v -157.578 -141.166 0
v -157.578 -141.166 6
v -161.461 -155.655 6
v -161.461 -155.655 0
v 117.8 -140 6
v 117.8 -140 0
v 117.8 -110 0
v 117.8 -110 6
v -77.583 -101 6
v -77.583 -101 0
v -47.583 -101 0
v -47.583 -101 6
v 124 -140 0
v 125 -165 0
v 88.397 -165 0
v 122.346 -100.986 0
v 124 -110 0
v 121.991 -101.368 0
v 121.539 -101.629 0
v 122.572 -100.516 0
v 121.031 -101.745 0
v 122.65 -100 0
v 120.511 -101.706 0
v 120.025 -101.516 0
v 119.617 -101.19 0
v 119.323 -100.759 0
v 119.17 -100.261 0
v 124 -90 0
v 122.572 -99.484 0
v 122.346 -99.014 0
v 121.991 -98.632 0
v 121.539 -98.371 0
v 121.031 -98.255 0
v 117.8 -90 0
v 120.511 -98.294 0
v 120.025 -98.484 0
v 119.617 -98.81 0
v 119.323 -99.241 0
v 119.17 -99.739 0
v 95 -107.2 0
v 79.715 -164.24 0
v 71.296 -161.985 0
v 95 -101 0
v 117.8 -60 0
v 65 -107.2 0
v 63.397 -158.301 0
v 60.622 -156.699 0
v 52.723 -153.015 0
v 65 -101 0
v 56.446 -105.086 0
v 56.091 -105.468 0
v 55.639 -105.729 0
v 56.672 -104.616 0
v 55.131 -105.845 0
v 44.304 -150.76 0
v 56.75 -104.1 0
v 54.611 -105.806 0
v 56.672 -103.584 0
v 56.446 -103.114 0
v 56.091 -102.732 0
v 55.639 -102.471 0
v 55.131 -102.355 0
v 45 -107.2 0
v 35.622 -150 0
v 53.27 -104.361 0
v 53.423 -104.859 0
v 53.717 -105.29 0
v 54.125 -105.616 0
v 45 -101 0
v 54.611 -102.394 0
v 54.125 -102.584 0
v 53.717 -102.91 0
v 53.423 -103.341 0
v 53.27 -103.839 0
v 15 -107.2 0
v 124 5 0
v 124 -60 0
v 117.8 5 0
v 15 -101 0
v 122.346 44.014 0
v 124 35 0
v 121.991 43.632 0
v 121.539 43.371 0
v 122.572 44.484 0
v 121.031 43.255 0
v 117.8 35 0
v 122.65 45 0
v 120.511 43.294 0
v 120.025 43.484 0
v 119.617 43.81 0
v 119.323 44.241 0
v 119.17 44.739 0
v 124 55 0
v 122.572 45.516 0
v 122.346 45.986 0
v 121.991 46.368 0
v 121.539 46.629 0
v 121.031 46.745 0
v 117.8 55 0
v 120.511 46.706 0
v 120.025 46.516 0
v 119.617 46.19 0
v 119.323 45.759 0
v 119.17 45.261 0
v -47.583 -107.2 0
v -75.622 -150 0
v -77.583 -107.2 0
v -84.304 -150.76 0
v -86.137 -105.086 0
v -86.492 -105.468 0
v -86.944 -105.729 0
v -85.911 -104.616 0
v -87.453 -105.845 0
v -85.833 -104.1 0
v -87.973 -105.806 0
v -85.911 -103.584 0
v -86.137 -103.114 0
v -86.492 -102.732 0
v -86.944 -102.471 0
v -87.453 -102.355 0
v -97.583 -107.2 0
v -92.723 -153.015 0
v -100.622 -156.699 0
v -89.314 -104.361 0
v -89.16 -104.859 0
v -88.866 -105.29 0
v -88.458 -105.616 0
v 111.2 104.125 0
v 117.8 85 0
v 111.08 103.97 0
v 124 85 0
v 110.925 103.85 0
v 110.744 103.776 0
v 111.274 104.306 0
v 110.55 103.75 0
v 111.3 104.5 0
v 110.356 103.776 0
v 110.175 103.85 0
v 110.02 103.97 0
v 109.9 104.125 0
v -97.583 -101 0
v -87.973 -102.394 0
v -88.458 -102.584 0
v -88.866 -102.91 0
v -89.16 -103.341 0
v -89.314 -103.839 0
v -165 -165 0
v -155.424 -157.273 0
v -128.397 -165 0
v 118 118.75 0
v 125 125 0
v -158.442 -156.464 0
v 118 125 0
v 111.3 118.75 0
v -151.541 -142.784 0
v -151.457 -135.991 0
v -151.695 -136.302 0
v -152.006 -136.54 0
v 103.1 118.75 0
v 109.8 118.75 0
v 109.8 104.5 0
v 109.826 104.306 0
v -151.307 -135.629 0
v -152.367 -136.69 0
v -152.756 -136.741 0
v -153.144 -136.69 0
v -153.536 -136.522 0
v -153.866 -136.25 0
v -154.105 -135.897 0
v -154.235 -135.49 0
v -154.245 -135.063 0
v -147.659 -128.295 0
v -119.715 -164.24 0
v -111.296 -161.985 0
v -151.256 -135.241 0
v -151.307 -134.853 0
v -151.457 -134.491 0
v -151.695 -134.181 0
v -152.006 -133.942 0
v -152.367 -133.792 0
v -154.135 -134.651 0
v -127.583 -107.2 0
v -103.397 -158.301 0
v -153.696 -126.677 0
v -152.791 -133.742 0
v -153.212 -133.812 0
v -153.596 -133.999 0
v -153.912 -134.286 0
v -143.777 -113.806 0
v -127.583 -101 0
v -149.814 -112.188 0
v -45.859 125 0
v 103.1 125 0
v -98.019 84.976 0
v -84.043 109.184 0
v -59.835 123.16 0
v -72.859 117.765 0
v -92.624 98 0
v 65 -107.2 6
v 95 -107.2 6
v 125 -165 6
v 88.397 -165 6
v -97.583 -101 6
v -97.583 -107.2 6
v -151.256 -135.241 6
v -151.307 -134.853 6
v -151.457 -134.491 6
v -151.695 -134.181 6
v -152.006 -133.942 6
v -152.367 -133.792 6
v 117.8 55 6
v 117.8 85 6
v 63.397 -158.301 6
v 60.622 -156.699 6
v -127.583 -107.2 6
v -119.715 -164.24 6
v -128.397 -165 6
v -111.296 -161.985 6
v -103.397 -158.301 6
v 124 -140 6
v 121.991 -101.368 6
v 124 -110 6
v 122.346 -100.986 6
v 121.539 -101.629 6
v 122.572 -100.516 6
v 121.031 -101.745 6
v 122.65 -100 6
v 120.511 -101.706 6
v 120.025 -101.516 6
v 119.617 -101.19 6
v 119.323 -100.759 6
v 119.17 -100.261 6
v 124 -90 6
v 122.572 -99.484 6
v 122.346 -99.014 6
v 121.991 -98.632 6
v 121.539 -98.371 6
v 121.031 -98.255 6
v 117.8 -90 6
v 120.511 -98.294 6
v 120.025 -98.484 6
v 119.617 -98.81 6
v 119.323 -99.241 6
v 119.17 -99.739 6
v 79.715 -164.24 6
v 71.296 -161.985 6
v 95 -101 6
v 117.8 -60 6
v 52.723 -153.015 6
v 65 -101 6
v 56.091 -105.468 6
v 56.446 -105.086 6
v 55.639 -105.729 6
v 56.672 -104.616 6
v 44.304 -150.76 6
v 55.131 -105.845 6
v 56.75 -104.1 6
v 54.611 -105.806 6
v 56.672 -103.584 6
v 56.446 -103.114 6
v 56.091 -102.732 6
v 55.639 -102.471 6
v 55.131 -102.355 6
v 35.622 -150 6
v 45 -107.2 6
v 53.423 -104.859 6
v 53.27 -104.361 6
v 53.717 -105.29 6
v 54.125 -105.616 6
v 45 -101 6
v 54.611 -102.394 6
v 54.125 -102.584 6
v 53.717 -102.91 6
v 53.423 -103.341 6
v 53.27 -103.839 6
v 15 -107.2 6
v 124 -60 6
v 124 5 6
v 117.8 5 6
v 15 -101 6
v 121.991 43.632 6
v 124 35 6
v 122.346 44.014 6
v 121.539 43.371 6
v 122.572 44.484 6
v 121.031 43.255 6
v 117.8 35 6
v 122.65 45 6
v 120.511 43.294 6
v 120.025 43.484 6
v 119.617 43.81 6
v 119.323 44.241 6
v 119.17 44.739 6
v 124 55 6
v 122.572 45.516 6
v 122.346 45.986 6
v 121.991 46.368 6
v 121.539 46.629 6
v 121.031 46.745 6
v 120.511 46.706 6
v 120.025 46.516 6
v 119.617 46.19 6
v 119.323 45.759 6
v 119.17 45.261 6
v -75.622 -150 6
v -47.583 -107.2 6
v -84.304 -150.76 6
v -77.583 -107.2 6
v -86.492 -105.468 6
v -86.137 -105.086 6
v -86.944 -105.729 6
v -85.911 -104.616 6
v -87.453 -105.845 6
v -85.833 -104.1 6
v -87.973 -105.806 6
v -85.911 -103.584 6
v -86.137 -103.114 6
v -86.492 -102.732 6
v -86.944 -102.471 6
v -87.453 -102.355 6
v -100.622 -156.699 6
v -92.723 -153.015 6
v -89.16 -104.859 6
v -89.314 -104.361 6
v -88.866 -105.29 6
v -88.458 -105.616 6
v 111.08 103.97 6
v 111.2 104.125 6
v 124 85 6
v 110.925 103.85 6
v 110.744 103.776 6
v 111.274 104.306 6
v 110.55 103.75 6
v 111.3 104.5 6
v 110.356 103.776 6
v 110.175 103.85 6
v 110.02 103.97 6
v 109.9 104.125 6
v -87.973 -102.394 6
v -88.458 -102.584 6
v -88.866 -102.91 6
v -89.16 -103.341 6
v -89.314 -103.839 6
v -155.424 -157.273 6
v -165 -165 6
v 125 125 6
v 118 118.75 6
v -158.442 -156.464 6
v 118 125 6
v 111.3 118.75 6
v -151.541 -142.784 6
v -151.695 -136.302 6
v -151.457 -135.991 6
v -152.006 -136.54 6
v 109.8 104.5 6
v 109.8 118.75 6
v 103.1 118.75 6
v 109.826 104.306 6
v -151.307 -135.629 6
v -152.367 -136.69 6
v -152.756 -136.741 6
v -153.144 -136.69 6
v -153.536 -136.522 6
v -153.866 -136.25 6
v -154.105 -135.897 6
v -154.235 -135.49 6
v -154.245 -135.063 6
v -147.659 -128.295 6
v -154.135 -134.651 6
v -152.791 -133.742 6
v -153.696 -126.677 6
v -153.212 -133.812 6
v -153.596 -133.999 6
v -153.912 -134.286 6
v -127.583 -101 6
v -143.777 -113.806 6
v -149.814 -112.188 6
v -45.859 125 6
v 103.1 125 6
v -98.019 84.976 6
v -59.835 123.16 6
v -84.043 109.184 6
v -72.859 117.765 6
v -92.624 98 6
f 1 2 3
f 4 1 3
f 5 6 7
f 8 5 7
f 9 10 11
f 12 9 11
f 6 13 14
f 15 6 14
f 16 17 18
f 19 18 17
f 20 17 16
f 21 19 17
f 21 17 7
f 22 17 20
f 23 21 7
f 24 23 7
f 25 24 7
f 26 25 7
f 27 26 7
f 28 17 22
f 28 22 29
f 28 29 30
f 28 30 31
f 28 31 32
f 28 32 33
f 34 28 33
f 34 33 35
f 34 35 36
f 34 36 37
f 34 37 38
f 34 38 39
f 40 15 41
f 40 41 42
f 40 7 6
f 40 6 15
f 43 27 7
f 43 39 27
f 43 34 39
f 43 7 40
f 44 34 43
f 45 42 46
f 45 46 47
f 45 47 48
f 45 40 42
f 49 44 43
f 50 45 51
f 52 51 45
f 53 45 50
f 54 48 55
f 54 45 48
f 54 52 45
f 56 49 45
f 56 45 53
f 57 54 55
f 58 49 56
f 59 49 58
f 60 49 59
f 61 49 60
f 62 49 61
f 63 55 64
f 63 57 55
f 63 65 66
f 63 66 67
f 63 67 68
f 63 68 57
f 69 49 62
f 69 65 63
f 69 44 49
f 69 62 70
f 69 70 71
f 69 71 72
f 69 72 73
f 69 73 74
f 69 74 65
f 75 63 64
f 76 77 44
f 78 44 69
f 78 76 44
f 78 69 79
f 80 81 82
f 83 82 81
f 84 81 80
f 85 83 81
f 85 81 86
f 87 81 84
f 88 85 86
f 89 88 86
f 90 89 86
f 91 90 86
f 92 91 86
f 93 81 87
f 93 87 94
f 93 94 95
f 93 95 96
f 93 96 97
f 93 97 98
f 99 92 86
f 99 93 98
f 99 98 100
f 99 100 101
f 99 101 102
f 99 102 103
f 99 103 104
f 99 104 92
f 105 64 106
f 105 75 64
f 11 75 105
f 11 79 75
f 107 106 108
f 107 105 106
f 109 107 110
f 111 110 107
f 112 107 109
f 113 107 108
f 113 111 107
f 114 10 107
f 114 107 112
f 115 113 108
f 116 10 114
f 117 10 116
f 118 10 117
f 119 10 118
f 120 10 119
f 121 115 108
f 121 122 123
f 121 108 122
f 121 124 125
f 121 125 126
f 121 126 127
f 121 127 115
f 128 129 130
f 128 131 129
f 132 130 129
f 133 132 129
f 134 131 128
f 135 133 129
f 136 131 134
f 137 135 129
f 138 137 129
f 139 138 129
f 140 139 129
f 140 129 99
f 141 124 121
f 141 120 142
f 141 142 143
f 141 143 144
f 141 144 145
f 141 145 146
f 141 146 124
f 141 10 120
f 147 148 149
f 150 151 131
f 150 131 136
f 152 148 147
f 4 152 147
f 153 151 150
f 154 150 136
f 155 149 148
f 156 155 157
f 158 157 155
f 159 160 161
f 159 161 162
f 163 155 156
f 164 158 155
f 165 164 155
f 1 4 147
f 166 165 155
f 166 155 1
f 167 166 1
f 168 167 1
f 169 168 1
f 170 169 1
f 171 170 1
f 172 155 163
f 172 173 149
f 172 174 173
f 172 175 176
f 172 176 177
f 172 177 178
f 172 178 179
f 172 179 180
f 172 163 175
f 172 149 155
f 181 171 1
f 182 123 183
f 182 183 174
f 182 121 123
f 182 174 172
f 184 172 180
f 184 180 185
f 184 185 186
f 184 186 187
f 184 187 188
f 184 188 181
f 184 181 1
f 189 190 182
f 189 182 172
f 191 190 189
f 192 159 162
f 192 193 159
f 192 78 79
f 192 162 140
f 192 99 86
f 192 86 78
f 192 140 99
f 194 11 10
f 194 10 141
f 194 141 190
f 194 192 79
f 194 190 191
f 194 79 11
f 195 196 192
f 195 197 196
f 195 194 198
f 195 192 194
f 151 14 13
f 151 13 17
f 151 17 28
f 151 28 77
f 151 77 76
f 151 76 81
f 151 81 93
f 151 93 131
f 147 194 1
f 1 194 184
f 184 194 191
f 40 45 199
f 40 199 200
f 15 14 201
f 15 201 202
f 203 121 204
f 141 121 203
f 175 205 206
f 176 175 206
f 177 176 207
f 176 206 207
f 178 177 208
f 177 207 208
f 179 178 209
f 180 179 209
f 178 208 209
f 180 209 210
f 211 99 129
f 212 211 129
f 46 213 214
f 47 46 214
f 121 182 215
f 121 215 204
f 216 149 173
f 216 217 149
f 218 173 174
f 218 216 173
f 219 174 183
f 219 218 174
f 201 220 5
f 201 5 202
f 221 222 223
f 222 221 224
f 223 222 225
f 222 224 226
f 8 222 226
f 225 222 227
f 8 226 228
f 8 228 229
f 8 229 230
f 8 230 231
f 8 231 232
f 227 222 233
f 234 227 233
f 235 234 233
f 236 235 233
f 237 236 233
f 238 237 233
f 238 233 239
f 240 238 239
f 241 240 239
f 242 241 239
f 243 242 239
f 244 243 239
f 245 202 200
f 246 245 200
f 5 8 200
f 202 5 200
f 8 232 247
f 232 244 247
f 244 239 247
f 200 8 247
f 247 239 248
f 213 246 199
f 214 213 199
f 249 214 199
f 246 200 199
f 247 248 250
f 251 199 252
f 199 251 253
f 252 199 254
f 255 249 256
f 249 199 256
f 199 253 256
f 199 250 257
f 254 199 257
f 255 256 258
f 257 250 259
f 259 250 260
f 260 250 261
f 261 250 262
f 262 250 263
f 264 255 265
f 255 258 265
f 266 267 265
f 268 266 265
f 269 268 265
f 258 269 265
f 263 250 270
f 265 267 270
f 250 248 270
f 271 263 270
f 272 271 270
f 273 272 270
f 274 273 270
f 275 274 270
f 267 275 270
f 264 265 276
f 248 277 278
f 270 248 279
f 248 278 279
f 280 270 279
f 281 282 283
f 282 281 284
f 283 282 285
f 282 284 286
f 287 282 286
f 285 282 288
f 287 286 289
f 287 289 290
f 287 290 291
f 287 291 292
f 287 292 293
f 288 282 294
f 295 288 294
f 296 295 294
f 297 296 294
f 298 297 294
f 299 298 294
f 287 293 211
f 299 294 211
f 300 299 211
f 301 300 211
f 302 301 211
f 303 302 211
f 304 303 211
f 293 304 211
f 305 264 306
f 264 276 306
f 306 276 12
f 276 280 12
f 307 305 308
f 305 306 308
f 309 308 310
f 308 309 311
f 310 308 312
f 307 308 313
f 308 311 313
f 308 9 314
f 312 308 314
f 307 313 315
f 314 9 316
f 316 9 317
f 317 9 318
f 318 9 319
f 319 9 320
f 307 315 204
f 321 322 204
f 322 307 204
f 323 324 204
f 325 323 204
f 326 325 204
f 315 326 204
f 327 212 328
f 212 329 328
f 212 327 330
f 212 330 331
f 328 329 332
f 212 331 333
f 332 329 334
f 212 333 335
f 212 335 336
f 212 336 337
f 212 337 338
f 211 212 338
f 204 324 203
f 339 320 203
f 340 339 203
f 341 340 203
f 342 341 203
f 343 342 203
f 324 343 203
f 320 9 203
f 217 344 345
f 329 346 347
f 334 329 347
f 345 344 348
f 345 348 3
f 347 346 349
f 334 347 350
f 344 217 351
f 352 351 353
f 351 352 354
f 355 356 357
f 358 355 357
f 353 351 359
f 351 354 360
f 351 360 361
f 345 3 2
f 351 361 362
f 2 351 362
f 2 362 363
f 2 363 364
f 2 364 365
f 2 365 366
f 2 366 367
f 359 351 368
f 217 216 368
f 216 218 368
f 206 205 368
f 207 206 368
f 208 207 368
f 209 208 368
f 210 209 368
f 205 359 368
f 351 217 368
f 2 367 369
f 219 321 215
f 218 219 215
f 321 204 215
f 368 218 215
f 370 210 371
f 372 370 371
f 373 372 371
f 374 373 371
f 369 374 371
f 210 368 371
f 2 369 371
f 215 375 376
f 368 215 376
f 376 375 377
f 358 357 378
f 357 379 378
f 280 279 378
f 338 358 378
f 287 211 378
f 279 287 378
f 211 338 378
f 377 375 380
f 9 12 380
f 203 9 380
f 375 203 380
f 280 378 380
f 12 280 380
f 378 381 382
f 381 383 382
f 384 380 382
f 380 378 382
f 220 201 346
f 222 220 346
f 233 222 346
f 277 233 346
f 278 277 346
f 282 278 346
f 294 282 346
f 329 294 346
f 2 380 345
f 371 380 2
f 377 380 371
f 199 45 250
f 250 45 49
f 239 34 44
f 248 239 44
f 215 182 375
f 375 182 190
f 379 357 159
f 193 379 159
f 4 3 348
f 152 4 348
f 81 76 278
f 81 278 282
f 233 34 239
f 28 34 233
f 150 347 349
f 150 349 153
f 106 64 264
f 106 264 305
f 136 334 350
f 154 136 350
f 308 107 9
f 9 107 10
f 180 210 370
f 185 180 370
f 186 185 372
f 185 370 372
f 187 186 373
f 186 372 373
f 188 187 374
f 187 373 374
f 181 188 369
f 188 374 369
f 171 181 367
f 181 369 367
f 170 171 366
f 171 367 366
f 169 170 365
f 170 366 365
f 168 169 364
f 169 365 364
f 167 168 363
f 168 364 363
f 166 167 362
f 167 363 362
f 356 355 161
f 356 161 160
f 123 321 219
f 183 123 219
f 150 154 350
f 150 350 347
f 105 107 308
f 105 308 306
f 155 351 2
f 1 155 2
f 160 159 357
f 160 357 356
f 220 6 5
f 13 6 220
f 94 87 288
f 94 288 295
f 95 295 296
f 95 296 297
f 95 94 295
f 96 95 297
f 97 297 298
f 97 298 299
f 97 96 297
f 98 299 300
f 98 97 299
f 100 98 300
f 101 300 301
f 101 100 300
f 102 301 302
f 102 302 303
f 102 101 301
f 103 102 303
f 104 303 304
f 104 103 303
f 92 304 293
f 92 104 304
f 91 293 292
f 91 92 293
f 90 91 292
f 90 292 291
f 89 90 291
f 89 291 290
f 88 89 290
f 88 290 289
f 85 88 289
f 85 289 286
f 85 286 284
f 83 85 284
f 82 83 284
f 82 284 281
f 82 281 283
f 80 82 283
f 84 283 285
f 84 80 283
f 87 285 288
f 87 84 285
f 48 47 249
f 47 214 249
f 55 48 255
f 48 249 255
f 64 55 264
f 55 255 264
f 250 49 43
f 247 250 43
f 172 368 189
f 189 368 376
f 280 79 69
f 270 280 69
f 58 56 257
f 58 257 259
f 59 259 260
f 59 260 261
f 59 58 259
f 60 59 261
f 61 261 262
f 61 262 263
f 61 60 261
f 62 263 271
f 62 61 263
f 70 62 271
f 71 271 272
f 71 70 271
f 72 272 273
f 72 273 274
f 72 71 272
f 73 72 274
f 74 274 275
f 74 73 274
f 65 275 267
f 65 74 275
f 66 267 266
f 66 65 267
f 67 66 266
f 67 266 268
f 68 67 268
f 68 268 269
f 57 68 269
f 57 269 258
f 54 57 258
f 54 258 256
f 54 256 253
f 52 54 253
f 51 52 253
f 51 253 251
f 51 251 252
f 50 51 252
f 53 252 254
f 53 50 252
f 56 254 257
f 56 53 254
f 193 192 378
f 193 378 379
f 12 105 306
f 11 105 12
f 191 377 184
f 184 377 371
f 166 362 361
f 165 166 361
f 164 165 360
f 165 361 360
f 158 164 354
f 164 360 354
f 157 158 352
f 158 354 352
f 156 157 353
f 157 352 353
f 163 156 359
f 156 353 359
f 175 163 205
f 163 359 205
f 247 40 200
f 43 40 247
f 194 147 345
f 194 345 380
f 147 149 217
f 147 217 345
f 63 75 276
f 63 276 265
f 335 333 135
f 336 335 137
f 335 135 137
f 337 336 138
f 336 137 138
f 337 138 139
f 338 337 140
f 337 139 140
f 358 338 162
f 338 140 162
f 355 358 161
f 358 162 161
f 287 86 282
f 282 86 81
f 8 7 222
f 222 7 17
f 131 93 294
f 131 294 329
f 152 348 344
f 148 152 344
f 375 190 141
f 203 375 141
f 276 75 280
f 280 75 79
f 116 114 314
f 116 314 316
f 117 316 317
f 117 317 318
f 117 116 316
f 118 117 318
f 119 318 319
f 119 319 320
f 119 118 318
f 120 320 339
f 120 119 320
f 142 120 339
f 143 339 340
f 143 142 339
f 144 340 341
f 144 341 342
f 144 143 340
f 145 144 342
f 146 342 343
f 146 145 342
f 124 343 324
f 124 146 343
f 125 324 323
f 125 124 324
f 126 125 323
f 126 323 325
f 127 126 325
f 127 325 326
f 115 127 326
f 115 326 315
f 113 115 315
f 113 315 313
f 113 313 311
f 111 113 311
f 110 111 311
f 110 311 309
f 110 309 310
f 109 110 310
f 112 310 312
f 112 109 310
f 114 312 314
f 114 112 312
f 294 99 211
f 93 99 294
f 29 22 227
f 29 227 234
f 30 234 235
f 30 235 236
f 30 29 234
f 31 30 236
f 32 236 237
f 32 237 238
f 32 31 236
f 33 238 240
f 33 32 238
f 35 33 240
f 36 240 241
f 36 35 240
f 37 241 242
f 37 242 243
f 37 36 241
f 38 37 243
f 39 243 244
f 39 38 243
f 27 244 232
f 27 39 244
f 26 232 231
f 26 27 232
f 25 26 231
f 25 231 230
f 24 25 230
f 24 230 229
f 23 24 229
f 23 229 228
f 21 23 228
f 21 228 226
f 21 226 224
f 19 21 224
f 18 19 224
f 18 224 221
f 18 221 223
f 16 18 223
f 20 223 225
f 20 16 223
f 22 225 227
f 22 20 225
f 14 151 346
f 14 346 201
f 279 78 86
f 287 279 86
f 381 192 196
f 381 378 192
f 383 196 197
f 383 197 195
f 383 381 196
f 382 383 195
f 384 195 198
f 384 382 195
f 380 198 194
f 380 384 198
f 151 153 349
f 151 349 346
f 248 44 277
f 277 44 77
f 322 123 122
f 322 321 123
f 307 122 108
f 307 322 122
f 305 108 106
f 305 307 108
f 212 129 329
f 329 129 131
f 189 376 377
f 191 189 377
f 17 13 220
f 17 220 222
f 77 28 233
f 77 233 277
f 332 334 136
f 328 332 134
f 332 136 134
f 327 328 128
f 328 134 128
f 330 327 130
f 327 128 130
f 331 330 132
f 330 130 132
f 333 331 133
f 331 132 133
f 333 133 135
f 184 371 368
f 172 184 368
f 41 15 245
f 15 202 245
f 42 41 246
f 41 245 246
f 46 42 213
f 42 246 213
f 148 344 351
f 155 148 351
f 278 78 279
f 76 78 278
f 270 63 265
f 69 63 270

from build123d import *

# Parameters (mm, degrees)
ESBO_O1_R                = 1.75
ESBO_O1_W                = 30
ESBO_O1_H                = 6.2
ESBO_O1_W_2              = 6.2
ESBO_O1_H_2              = 30
RESSALTO_EXTRUS_O1_DEPTH = 6
FILETE1_R                = 54
FILETE2_R                = 50
ESBO_O2_W                = 14.9
ESBO_O2_H                = 6
CORTE_EXTRUS_O1_DEPTH    = 6.25
ESBO_O3_W                = 1.5
ESBO_O3_H                = 15
CORTE_EXTRUS_O2_DEPTH    = 10
FILETE3_R                = 0.75
CORTE_EXTRUS_O3_DEPTH    = 22


with BuildPart() as part:
    # Esboço1 → Ressalto-extrusão1 (new body)
    with BuildSketch(Plane.XY):
        Polygon((125, -165), (75, -165), (49.019237886, -150), (-89.019237886, -150), (-115, -165), (-165, -165), (-87.294734195, 125), (125, 125), align=None)
        with Locations((-87.583302492, -104.1)):
            Circle(ESBO_O1_R, mode=Mode.SUBTRACT)
        with Locations((120.9, 45)):
            Circle(ESBO_O1_R, mode=Mode.SUBTRACT)
        with Locations((55, -104.1)):
            Circle(ESBO_O1_R, mode=Mode.SUBTRACT)
        with Locations((120.9, -100)):
            Circle(ESBO_O1_R, mode=Mode.SUBTRACT)
        with Locations((80, -104.1)):
            Rectangle(ESBO_O1_W, ESBO_O1_H, mode=Mode.SUBTRACT)
        with Locations((30, -104.1)):
            Rectangle(ESBO_O1_W, ESBO_O1_H, mode=Mode.SUBTRACT)
        with Locations((-112.583302492, -104.1)):
            Rectangle(ESBO_O1_W, ESBO_O1_H, mode=Mode.SUBTRACT)
        with Locations((-62.583302492, -104.1)):
            Rectangle(ESBO_O1_W, ESBO_O1_H, mode=Mode.SUBTRACT)
        with Locations((120.9, 70)):
            Rectangle(ESBO_O1_W_2, ESBO_O1_H_2, mode=Mode.SUBTRACT)
        with Locations((120.9, 20)):
            Rectangle(ESBO_O1_W_2, ESBO_O1_H_2, mode=Mode.SUBTRACT)
        with Locations((120.9, -125)):
            Rectangle(ESBO_O1_W_2, ESBO_O1_H_2, mode=Mode.SUBTRACT)
        with Locations((120.9, -75)):
            Rectangle(ESBO_O1_W_2, ESBO_O1_H_2, mode=Mode.SUBTRACT)
    extrude(amount=RESSALTO_EXTRUS_O1_DEPTH)

    # Filete1
    filete1_edges = [part.edges().sort_by_distance(p)[0] for p in [
        (-87.294734195, 125, 3),
    ]]
    fillet(filete1_edges, radius=FILETE1_R)

    # Filete2
    filete2_edges = [part.edges().sort_by_distance(p)[0] for p in [
        (75, -165, 3),
        (49.019237886, -150, 3),
        (-89.019237886, -150, 3),
        (-115, -165, 3),
    ]]
    fillet(filete2_edges, radius=FILETE2_R)

    # Esboço2 → Corte-extrusão1 (cut)
    with BuildSketch(Plane(origin=(0, 125, 0), x_dir=(1, 0, 0), z_dir=(0, 1, 0))):
        with Locations((110.55, -3)):
            Rectangle(ESBO_O2_W, ESBO_O2_H)
    extrude(amount=-CORTE_EXTRUS_O1_DEPTH, mode=Mode.SUBTRACT)

    # Esboço3 → Corte-extrusão2 (cut)
    with BuildSketch(Plane.XY.offset(6)):
        with Locations((110.55, 111.25)):
            Rectangle(ESBO_O3_W, ESBO_O3_H)
    extrude(amount=-CORTE_EXTRUS_O2_DEPTH, mode=Mode.SUBTRACT)

    # Filete3
    filete3_edges = [part.edges().sort_by_distance(p)[0] for p in [
        (111.3, 103.75, 3),
        (109.8, 103.75, 3),
    ]]
    fillet(filete3_edges, radius=FILETE3_R - 0.0001)  # a hair under: the kernel refuses the full size

    # Esboço4 → Corte-extrusão3 (cut)
    with BuildSketch(Plane.XY.offset(6)):
        Polygon((-149.813874716, -112.188312175), (-153.696160392, -126.677199569), (-150.677642185, -127.486009085), (-146.795356509, -112.997121691), align=None)
        Polygon((-146.795356509, -112.997121691), (-150.677642185, -127.486009085), (-147.659123978, -128.294818601), (-143.776838302, -113.805931207), align=None)
        with BuildLine():
            ThreePointArc((-152.367408211, -133.792301745), (-154.204525518, -134.852961916), (-153.143865346, -136.690079223))
            Line((-153.143865346, -136.690079223), (-152.367408211, -133.792301745))
        make_face()
        with BuildLine():
            Line((-152.367408211, -133.792301745), (-153.143865346, -136.690079223))
            ThreePointArc((-153.143865346, -136.690079223), (-151.842494635, -136.431220494), (-151.255636778, -135.241190484))
            ThreePointArc((-151.255636778, -135.241190484), (-151.565606768, -134.328048341), (-152.367408211, -133.792301745))
        make_face()
        Polygon((-157.578446069, -141.166086963), (-161.460731746, -155.654974358), (-158.442213538, -156.463783874), (-154.559927862, -141.974896479), align=None)
        Polygon((-154.559927862, -141.974896479), (-158.442213538, -156.463783874), (-155.423695331, -157.27259339), (-151.541409655, -142.783705995), align=None)
    extrude(amount=-CORTE_EXTRUS_O3_DEPTH, mode=Mode.SUBTRACT)


solid = part.part
